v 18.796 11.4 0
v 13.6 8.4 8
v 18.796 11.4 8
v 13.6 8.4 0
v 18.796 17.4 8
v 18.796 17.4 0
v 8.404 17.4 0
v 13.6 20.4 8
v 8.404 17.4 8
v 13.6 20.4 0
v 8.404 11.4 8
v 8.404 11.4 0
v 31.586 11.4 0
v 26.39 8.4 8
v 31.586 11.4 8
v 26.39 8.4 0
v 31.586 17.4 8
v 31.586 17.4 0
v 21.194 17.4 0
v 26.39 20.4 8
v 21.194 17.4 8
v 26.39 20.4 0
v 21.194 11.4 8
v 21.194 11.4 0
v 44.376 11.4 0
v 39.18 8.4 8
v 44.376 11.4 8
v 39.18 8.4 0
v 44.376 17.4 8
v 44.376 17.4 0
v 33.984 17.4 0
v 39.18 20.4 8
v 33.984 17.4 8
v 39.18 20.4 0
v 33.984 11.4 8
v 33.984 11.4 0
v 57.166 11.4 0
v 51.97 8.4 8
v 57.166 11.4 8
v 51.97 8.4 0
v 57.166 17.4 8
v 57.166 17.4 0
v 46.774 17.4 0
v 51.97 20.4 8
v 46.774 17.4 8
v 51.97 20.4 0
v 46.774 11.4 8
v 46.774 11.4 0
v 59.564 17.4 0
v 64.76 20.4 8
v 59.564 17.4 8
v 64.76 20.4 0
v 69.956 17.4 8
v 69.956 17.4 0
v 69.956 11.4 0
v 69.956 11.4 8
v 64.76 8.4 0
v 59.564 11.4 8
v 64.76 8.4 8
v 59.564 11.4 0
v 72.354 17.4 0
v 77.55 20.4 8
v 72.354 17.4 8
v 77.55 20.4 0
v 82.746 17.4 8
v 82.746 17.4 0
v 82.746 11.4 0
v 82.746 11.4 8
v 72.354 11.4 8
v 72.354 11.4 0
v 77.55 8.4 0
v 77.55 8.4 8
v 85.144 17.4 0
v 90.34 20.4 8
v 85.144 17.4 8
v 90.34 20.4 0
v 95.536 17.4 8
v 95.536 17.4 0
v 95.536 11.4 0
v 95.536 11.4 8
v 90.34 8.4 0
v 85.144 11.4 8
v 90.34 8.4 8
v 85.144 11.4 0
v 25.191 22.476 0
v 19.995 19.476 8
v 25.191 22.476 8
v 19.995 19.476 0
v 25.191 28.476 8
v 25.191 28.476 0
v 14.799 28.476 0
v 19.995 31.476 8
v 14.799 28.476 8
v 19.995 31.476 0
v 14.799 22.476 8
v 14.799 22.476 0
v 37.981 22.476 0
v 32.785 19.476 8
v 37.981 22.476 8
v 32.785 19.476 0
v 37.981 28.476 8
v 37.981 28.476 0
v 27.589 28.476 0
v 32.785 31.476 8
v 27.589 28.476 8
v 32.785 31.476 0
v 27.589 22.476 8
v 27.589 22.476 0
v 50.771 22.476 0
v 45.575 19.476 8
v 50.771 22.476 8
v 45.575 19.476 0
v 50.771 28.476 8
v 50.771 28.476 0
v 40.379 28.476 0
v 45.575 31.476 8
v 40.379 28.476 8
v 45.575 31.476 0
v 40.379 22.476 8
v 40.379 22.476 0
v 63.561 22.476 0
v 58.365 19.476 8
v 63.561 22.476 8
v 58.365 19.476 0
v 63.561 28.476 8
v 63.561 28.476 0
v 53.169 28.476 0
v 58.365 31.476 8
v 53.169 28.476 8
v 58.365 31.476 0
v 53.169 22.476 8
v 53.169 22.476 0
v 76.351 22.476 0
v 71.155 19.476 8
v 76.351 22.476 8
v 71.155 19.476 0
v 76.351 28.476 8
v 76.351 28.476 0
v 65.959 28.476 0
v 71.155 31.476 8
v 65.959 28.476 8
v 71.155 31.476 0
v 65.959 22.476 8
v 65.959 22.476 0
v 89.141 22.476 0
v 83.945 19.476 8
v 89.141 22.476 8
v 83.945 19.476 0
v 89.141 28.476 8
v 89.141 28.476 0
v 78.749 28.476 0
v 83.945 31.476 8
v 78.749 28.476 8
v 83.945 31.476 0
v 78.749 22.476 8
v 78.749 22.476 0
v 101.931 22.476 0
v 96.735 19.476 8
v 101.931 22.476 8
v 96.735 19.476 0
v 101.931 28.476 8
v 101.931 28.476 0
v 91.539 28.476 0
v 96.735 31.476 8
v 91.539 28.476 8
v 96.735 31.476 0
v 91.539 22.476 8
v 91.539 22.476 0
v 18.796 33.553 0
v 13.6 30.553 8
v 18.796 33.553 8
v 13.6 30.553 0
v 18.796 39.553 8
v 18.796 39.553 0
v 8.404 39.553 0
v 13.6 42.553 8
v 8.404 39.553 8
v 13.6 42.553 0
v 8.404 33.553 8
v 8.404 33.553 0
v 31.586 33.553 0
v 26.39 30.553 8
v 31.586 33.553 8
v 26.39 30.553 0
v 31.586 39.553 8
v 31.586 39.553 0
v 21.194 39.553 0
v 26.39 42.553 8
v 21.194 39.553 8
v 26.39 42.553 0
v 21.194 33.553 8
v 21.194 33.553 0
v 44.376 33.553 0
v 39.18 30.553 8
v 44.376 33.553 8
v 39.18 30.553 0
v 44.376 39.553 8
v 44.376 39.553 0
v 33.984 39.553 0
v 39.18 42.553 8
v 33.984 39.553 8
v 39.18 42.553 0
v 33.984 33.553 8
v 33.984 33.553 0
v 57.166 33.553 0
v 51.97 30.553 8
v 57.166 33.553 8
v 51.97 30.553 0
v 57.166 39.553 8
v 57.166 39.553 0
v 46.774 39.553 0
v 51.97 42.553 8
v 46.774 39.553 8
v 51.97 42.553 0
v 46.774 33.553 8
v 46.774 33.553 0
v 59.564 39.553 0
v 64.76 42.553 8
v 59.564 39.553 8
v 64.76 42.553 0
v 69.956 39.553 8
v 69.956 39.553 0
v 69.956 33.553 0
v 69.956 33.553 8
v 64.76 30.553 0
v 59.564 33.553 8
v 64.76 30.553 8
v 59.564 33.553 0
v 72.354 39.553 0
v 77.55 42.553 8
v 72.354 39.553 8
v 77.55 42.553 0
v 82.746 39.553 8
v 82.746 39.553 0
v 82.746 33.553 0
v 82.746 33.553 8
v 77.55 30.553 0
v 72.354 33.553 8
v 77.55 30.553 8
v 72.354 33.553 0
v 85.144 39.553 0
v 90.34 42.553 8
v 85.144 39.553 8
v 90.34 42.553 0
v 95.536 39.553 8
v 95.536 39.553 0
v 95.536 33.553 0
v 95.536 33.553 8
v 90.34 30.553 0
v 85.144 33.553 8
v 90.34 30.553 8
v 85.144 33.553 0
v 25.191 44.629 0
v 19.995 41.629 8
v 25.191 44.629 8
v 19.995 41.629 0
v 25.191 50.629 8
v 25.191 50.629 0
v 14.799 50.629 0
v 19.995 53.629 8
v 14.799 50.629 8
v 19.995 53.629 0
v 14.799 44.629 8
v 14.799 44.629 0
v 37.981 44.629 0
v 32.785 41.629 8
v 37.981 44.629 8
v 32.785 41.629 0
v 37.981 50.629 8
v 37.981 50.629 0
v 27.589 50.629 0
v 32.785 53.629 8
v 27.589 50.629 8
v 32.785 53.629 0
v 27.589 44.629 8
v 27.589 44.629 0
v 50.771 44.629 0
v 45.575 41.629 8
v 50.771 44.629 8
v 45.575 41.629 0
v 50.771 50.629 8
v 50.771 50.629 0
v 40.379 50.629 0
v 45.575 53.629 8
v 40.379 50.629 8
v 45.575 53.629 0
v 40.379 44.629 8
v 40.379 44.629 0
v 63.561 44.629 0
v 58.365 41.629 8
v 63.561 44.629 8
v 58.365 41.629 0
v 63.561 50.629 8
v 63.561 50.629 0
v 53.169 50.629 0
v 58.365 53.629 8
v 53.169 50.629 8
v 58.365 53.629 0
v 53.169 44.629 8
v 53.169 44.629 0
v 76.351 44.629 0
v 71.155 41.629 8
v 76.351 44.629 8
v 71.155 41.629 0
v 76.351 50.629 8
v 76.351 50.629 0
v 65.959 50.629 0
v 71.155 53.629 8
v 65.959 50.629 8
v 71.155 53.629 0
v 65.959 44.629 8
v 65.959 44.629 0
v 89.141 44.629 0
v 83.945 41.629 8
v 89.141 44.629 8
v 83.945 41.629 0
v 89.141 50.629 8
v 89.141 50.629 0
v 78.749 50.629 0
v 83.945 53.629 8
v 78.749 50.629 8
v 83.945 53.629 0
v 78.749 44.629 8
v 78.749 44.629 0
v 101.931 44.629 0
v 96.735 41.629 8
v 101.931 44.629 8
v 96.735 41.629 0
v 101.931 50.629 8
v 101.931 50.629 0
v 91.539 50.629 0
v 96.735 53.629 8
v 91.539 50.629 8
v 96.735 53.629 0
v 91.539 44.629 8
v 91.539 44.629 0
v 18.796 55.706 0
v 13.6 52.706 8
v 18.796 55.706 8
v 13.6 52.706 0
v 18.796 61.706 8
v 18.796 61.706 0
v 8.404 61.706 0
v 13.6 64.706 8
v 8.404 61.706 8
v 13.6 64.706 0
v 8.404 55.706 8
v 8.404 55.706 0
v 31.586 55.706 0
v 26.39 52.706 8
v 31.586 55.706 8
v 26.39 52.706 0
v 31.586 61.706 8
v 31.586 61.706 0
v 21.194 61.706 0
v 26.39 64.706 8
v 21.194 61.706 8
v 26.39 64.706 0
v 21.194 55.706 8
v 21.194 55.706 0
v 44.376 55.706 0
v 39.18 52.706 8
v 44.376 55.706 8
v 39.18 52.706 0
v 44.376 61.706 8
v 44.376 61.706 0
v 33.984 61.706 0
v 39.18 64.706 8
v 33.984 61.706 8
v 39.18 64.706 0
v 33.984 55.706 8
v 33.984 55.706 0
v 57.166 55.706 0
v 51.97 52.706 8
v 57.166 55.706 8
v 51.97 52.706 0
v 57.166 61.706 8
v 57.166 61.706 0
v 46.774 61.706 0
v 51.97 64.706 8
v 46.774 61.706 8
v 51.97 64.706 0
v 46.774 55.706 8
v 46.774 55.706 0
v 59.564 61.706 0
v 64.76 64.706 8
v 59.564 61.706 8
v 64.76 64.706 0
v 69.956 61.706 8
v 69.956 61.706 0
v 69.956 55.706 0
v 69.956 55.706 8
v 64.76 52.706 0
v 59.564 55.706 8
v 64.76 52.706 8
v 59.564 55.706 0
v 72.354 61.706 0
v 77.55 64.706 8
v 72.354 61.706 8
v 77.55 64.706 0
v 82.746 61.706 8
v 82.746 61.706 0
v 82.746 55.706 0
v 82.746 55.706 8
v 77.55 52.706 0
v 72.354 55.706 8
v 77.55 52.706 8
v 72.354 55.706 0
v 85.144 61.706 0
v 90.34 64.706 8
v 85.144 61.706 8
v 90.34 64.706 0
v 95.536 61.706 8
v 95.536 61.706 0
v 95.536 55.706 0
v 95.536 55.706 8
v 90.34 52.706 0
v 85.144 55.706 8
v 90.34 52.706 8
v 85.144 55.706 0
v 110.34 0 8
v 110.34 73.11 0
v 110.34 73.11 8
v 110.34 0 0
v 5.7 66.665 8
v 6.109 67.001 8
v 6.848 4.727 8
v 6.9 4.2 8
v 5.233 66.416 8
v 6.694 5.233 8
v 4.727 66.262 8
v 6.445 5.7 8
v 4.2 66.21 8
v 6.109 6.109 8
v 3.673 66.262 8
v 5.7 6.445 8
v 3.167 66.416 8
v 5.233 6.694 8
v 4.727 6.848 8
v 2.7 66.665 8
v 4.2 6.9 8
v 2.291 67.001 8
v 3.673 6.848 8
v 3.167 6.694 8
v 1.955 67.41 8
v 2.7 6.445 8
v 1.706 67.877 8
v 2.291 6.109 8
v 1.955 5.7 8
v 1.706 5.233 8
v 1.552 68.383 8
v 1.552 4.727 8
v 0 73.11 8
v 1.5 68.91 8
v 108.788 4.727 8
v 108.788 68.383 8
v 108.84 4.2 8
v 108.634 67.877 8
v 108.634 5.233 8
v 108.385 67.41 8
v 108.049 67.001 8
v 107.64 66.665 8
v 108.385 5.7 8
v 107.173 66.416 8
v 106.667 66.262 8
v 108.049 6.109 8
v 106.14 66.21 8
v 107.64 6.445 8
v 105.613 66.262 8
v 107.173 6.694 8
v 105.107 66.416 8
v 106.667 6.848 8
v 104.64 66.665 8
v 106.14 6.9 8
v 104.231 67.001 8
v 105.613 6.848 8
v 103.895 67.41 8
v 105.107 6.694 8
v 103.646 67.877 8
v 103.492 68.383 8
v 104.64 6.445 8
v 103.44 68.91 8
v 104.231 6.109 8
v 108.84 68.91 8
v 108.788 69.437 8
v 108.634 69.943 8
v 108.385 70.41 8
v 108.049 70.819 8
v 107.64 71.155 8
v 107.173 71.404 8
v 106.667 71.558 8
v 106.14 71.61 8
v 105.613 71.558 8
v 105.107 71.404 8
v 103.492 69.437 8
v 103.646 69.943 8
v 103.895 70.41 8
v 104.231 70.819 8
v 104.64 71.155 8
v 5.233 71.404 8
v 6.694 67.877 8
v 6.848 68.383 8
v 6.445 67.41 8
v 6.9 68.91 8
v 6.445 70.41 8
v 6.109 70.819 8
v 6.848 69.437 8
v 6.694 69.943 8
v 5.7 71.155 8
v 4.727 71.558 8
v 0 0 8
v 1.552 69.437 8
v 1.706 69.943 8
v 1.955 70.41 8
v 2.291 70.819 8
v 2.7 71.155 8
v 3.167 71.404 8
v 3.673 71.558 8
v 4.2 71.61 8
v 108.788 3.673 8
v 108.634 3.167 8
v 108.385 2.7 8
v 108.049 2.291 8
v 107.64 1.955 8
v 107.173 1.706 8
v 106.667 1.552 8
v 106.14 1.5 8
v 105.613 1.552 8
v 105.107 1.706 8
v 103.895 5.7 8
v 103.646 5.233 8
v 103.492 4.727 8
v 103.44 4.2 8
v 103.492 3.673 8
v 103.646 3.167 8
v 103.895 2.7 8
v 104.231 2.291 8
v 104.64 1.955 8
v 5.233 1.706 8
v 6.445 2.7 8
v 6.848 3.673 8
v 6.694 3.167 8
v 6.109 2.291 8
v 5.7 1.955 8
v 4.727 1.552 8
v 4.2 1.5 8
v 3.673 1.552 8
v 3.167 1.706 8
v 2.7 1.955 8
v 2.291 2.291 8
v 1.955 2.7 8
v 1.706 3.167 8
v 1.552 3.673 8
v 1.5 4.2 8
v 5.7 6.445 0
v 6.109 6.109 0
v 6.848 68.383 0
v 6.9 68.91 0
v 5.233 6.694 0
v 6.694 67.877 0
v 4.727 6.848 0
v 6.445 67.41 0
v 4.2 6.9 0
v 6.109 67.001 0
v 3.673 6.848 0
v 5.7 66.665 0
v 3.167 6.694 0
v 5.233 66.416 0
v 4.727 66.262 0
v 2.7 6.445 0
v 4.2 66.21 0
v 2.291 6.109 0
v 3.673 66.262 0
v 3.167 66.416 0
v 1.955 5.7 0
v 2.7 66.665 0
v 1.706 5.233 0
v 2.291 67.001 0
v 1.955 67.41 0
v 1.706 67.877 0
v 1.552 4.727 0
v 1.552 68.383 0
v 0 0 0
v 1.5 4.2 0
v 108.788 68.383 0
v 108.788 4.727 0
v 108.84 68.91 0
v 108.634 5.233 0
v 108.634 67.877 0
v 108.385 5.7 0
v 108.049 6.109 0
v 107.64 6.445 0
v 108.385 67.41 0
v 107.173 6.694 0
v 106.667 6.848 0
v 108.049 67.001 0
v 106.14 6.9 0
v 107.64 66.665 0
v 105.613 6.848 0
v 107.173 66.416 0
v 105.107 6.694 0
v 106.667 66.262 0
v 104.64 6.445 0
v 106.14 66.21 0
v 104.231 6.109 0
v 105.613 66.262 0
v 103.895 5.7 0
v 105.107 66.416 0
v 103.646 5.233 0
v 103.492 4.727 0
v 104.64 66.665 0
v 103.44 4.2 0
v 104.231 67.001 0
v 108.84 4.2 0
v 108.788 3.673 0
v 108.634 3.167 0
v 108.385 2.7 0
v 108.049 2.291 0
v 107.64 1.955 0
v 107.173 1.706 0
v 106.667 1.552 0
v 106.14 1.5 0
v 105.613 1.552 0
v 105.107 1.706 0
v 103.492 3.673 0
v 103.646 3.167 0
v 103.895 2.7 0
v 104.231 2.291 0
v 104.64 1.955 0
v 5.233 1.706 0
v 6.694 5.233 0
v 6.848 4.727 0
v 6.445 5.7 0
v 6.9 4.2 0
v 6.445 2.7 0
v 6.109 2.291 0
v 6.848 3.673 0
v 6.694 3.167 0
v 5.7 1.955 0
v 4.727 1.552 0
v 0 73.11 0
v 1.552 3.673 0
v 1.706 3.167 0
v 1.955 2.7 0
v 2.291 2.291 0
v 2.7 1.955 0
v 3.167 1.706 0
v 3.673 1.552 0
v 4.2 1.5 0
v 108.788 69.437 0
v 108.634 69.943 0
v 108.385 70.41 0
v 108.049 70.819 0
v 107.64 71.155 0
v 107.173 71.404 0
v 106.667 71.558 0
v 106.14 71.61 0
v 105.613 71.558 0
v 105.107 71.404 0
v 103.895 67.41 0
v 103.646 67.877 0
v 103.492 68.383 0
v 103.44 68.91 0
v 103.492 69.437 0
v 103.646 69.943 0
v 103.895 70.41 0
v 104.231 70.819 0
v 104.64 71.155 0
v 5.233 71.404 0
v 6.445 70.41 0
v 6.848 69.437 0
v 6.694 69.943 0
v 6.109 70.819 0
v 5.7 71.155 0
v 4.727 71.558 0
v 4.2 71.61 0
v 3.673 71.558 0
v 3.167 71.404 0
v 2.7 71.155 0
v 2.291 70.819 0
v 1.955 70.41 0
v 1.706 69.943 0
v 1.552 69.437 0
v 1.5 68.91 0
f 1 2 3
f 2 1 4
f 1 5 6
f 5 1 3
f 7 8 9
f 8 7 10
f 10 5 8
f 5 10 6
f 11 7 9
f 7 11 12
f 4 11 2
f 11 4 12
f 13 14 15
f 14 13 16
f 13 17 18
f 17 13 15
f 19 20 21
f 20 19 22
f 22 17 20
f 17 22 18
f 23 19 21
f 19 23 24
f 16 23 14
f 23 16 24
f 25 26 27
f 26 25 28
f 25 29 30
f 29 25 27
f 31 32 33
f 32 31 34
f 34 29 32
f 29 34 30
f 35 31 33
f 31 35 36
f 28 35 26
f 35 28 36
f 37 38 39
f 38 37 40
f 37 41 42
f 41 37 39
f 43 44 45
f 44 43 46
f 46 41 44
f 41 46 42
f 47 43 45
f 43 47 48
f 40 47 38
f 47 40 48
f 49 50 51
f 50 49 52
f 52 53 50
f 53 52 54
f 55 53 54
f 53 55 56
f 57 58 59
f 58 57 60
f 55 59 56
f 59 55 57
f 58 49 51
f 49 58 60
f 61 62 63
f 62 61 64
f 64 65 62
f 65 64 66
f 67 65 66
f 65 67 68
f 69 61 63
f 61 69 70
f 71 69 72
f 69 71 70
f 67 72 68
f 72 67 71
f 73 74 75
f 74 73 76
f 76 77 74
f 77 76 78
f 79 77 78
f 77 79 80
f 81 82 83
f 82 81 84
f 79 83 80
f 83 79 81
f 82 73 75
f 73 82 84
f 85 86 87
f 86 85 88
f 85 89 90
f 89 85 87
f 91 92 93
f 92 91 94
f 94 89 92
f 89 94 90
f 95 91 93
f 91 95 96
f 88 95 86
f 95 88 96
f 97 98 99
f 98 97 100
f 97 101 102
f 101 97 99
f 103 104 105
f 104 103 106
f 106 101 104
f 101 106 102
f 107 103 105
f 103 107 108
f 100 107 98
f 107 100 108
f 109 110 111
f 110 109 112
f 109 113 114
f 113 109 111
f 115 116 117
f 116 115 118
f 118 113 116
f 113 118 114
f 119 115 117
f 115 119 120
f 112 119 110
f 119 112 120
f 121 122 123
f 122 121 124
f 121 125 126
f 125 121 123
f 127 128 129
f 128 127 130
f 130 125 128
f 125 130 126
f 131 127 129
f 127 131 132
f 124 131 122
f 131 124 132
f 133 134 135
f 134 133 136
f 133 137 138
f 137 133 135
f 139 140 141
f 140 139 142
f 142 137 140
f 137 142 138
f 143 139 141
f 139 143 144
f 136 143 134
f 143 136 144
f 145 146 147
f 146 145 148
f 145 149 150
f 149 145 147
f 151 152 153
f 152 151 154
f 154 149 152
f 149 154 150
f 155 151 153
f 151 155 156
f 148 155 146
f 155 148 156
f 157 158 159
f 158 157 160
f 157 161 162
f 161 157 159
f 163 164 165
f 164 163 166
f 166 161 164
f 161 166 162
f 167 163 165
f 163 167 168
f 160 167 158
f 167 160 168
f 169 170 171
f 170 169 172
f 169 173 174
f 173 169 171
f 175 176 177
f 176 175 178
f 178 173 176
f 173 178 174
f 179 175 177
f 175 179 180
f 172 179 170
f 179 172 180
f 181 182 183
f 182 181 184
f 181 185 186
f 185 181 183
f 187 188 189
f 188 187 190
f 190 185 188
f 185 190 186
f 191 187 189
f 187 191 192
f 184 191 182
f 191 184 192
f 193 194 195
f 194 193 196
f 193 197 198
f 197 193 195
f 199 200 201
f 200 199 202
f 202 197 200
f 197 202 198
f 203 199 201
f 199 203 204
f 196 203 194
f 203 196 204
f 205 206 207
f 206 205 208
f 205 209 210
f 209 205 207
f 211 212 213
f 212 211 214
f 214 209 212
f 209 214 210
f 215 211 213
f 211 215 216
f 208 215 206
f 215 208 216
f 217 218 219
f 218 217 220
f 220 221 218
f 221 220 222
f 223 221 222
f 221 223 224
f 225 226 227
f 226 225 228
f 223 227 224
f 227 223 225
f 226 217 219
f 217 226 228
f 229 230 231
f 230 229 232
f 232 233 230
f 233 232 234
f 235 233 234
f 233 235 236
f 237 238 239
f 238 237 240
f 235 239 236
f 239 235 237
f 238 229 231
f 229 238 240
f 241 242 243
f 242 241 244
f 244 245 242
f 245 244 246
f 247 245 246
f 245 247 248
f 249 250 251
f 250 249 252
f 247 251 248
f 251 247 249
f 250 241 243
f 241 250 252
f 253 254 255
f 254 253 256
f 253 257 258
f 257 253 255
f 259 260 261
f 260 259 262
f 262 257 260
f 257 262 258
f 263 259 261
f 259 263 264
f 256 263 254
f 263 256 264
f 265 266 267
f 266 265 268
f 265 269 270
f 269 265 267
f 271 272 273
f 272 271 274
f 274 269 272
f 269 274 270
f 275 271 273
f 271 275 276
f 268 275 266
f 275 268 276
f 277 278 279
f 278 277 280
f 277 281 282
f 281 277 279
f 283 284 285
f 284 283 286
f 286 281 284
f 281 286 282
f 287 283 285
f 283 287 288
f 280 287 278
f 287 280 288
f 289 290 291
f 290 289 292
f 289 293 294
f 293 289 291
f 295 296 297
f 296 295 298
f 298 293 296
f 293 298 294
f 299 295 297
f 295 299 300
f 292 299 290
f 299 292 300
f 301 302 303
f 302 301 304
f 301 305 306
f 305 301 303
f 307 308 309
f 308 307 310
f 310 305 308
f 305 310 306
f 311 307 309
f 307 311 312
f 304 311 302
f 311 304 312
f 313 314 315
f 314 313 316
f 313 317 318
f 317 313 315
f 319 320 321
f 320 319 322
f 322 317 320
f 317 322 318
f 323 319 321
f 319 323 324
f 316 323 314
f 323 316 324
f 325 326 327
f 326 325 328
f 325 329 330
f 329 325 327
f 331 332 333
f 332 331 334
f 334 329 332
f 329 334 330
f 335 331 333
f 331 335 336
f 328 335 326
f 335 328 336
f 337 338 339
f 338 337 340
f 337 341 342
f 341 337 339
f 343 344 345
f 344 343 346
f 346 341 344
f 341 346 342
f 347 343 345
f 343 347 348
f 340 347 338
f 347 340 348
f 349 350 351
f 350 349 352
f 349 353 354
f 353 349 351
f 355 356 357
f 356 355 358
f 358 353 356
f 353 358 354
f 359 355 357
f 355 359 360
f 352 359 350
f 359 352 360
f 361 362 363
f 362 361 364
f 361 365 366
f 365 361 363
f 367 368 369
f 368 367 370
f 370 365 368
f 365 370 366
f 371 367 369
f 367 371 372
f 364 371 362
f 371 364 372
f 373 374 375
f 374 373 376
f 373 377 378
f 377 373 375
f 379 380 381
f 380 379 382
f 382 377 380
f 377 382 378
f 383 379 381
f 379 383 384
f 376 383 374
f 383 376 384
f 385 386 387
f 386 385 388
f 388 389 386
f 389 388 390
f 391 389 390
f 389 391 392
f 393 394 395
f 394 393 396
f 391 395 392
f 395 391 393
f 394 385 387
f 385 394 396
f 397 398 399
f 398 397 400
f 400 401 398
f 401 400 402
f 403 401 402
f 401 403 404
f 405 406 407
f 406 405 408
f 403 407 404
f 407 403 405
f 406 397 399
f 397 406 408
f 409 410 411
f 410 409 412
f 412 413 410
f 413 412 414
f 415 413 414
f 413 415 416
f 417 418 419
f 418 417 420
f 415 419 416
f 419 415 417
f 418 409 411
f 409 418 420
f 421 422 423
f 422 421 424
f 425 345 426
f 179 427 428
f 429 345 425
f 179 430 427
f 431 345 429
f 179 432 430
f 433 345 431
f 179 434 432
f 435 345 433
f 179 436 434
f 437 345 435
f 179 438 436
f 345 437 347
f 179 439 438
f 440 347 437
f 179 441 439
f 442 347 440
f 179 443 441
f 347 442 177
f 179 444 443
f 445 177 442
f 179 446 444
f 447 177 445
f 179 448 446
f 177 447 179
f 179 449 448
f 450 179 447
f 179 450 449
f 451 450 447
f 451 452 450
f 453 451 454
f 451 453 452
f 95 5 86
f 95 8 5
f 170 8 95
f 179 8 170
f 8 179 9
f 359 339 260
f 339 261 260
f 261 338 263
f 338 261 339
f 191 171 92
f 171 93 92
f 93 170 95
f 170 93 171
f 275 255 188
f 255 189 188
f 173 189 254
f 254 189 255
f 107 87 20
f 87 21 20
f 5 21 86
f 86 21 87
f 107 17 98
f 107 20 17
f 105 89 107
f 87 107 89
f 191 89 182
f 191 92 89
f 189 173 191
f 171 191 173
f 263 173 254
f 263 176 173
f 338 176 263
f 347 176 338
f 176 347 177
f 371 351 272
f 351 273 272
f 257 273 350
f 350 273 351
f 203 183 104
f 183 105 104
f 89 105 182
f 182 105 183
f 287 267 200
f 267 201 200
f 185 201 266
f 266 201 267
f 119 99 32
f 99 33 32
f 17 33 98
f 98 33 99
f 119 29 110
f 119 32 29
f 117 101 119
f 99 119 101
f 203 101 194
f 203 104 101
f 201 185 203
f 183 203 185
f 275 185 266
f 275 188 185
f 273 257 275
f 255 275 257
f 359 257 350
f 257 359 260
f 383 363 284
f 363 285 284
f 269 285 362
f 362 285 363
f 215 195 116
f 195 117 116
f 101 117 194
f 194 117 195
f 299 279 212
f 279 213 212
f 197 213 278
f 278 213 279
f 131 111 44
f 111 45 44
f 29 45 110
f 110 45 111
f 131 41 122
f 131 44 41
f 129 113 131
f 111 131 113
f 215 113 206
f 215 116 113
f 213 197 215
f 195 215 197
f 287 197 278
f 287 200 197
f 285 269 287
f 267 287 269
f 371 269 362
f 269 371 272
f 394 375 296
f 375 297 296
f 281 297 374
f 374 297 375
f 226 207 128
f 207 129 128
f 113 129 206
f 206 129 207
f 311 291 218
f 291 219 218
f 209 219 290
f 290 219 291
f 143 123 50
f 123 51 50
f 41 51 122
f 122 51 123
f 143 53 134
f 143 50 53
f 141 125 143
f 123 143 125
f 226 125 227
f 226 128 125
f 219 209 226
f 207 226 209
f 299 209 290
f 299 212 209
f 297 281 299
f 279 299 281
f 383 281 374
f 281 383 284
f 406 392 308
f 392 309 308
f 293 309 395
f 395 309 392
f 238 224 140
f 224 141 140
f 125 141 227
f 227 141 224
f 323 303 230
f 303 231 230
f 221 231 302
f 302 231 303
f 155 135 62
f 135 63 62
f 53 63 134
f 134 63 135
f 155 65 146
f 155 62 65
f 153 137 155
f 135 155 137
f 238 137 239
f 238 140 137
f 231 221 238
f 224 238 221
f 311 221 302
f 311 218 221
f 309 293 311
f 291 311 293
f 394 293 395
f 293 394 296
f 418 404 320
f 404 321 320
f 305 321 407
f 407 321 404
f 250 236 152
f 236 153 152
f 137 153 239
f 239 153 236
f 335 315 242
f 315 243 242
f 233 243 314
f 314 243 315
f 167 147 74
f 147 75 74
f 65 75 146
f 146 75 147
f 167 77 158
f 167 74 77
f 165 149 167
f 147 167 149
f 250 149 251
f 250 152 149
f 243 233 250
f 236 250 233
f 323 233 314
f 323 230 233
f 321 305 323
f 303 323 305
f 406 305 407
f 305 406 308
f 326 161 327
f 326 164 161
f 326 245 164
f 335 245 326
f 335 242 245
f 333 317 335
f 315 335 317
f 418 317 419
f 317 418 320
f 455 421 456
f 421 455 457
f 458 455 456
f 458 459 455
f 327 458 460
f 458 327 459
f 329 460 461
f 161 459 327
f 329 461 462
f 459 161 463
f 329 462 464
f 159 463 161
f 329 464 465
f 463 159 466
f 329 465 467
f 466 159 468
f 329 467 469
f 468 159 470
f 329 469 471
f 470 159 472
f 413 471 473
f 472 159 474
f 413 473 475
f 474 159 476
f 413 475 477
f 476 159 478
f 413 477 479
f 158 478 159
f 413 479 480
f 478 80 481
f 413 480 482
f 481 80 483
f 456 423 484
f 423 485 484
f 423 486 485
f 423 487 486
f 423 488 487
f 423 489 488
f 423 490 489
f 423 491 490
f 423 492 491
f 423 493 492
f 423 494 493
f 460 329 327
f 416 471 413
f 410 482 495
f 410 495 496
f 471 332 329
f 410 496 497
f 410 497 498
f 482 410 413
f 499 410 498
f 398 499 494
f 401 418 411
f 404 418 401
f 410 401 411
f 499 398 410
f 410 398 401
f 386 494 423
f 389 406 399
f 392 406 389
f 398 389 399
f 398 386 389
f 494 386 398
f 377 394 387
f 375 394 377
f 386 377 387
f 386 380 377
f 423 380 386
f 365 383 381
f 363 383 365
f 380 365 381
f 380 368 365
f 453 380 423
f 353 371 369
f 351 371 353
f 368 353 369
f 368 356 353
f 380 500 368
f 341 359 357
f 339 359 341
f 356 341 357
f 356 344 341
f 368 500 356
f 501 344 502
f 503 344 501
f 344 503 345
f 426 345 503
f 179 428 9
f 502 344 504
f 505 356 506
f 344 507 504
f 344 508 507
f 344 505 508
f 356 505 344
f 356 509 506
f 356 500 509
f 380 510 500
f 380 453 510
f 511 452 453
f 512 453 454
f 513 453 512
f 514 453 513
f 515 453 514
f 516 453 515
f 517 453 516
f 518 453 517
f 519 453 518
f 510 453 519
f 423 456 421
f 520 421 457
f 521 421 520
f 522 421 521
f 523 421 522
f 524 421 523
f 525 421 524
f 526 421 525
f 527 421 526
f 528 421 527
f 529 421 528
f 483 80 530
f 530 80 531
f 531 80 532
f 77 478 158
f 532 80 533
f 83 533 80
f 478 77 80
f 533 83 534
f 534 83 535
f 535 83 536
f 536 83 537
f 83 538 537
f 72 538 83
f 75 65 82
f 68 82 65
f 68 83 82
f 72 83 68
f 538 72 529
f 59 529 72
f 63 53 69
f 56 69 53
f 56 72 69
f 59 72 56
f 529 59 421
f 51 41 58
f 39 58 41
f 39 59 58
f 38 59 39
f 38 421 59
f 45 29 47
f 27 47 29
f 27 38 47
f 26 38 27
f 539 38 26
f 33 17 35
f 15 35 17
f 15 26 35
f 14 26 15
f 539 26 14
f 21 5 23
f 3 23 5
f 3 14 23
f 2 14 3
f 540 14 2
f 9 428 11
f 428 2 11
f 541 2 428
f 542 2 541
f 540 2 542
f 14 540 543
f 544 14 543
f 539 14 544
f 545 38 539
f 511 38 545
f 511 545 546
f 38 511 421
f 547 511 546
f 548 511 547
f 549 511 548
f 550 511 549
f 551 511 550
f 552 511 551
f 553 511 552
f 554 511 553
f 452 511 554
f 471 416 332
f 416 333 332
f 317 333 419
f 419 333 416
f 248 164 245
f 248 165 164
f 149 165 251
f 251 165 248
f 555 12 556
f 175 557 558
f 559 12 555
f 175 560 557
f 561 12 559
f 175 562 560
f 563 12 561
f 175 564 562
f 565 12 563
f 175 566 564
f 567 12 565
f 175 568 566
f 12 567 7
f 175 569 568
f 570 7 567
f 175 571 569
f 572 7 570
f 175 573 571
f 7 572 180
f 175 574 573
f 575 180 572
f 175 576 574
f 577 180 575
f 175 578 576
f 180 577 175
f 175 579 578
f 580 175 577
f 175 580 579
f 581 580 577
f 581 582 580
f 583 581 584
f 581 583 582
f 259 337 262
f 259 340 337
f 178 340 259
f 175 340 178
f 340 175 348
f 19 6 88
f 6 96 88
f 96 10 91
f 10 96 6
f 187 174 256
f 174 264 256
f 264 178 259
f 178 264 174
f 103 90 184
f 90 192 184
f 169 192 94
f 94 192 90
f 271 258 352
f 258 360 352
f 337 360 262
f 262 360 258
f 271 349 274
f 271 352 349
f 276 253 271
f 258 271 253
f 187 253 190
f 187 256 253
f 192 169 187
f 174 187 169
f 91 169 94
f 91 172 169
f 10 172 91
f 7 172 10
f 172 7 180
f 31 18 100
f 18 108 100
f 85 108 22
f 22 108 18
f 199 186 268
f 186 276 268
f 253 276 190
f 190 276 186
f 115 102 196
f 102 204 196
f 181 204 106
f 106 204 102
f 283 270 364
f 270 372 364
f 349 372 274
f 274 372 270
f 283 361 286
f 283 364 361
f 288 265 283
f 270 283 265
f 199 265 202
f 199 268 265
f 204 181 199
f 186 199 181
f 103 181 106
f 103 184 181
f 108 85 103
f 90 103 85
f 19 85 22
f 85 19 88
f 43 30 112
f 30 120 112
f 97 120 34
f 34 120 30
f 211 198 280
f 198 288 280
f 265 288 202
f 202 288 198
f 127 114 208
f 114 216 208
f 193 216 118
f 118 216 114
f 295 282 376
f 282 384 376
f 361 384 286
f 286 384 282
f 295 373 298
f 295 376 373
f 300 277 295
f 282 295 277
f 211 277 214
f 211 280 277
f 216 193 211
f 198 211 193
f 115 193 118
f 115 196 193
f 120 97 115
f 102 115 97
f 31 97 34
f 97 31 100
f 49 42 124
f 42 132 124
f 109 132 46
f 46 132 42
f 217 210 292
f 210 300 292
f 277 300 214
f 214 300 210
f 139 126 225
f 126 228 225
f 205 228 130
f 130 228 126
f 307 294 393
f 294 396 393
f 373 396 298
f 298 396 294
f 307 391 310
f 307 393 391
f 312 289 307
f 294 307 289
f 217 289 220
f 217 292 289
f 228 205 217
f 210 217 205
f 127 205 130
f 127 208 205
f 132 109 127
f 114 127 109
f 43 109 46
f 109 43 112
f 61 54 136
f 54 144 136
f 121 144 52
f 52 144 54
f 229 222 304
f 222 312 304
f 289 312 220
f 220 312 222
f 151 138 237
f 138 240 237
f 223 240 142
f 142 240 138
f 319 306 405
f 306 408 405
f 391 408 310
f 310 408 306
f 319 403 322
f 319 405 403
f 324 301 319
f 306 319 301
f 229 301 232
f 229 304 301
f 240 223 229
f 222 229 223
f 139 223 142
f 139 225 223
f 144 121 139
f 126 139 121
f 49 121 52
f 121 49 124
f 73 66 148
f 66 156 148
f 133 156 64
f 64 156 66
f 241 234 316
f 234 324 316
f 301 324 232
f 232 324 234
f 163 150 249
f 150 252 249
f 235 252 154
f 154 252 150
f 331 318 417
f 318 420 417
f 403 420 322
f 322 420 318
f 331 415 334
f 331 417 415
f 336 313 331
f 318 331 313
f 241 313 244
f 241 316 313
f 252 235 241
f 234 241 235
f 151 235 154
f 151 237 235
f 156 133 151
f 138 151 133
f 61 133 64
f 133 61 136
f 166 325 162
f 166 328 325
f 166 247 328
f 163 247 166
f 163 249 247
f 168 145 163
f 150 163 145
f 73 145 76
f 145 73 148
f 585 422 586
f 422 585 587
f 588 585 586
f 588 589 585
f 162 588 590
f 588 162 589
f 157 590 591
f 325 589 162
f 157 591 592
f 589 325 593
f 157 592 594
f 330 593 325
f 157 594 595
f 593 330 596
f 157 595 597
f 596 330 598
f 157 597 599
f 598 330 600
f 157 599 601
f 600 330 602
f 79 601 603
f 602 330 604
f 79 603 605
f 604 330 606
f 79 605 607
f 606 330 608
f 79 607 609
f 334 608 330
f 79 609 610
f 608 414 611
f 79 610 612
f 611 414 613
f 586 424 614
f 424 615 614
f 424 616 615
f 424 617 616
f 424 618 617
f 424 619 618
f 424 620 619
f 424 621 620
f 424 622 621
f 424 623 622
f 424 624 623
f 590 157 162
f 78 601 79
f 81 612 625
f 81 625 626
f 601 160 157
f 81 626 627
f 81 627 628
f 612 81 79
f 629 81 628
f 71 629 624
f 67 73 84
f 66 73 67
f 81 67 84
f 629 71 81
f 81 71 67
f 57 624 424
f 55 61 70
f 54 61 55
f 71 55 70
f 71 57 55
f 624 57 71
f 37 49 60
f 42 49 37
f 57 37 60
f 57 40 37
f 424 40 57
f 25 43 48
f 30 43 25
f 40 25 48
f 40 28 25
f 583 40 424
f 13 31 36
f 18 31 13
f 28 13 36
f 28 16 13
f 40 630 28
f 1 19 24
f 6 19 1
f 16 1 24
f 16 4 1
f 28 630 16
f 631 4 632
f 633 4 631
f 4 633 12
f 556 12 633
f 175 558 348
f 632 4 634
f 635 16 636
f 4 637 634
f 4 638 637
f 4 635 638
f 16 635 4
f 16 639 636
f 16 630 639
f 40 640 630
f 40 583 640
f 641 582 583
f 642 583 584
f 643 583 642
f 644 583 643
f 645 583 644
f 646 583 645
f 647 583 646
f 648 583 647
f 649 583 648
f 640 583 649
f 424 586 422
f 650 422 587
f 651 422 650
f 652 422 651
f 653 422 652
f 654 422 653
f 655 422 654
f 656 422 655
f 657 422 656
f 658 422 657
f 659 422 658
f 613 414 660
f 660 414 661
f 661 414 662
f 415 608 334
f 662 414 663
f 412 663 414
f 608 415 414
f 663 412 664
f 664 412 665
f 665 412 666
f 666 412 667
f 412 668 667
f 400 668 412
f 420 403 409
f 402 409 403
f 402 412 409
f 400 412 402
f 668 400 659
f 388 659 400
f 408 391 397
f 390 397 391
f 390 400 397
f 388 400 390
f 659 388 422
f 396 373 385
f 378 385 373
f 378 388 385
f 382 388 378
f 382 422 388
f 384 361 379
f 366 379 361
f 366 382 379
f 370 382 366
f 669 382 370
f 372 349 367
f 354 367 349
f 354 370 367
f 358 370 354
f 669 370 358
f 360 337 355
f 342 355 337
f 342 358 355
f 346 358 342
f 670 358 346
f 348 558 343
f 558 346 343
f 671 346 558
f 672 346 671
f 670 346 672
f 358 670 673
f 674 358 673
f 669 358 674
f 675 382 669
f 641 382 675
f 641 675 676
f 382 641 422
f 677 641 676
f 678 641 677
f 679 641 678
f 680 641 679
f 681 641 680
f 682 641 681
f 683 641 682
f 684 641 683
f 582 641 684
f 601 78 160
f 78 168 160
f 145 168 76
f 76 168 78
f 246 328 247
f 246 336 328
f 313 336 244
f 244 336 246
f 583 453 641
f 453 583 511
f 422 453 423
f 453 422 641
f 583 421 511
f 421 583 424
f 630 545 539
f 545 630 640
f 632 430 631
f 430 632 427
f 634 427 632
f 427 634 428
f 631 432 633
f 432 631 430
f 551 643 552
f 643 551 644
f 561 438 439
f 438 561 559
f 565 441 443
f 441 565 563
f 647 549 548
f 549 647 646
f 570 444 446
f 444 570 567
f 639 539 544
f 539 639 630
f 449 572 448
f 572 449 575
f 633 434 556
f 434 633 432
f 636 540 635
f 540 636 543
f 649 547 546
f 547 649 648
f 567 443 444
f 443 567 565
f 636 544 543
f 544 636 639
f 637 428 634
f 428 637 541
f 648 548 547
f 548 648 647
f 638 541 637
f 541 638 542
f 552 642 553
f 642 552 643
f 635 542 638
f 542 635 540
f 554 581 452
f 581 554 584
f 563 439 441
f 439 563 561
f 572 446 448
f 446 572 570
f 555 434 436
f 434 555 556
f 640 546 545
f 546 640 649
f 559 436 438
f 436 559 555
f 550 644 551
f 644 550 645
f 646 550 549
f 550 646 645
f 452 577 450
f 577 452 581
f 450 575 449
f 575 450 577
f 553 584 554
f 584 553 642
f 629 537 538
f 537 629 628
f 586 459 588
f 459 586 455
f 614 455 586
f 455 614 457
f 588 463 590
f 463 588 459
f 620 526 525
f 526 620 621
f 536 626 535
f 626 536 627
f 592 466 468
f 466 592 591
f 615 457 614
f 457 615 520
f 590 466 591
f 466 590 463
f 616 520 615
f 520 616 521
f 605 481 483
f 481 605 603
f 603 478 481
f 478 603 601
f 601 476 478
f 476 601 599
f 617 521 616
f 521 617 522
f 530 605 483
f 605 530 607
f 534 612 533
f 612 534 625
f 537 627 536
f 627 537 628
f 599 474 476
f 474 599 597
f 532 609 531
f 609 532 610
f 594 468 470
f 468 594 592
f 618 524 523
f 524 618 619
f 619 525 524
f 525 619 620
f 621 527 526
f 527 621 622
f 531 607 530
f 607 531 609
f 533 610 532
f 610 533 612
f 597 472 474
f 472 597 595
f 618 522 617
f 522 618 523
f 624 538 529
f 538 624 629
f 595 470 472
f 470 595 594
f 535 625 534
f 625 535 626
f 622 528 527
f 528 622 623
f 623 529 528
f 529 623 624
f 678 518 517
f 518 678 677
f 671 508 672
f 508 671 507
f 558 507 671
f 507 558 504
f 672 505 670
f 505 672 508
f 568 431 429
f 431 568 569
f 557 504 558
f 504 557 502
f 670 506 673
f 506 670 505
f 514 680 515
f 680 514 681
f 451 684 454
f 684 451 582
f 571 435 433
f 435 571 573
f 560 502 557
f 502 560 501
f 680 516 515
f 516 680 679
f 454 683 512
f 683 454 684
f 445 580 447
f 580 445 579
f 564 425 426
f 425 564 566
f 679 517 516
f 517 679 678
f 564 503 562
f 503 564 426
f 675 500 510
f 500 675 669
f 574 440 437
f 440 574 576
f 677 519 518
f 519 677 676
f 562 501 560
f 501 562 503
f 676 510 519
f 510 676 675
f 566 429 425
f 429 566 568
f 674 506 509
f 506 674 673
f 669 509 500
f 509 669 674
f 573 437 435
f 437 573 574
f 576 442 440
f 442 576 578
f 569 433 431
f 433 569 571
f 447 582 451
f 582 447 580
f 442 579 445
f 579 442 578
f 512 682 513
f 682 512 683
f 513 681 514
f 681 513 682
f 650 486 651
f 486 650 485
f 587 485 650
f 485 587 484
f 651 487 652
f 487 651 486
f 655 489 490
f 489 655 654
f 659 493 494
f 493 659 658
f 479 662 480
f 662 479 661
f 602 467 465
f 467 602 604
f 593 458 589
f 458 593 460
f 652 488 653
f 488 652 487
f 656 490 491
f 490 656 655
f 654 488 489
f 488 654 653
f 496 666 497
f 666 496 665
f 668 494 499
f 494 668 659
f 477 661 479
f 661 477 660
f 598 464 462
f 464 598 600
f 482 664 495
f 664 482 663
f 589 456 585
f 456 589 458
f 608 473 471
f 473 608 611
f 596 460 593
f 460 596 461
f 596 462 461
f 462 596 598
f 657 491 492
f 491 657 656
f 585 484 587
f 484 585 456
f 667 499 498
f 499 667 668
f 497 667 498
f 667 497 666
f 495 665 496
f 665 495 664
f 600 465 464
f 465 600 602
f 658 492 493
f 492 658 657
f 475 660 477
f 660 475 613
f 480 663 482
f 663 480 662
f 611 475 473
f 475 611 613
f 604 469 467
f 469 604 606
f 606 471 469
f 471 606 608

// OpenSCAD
$fn = 32;

// ----------------------------------------------------------------------
// Honeycomb panel: 110.34 x 73.11 mm, 35 cells of 12 mm
// ----------------------------------------------------------------------

// --- parameters (mm) ---
panel_w = 110.34;         // panel width
panel_d = 73.11;          // panel depth
thick = 8;                // panel thickness
cell_r = 6;               // hex cell circumradius
pitch = 12.79;            // hex cell pitch (centre to centre)
web = 2.4;                // web between the cells
columns = 7;              // columns of cells
rows = 5;                 // rows of cells
cell_count = 35;          // total cells
shift_x = 13.6;           // first cell offset in x
shift_y = 14.4;           // first cell offset in y
mount_d = 5.4;            // corner mounting holes
hole_off = 4.2;           // mounting hole offset from the corners

difference() {
  union() {
    cube([panel_w, panel_d, thick]);
  }
  /* hexagonal cells, point-up, cut right through the plate */
  for (row = [0 : rows - 1]) {
    for (col = [0 : columns - 1]) {
      translate([shift_x + col * pitch + (row % 2) * pitch / 2, shift_y + row * pitch * 0.866025, -2.5]) rotate([0, 0, 30]) cylinder(h = thick + 5, d = 2 * cell_r, $fn = 6);
    }
  }
  /* corner mounting holes, clear of the outer cell web */
  translate([4.2, 4.2, -2.5]) cylinder(h = thick + 5, d = mount_d);
  translate([106.14, 4.2, -2.5]) cylinder(h = thick + 5, d = mount_d);
  translate([4.2, 68.91, -2.5]) cylinder(h = thick + 5, d = mount_d);
  translate([106.14, 68.91, -2.5]) cylinder(h = thick + 5, d = mount_d);
}
